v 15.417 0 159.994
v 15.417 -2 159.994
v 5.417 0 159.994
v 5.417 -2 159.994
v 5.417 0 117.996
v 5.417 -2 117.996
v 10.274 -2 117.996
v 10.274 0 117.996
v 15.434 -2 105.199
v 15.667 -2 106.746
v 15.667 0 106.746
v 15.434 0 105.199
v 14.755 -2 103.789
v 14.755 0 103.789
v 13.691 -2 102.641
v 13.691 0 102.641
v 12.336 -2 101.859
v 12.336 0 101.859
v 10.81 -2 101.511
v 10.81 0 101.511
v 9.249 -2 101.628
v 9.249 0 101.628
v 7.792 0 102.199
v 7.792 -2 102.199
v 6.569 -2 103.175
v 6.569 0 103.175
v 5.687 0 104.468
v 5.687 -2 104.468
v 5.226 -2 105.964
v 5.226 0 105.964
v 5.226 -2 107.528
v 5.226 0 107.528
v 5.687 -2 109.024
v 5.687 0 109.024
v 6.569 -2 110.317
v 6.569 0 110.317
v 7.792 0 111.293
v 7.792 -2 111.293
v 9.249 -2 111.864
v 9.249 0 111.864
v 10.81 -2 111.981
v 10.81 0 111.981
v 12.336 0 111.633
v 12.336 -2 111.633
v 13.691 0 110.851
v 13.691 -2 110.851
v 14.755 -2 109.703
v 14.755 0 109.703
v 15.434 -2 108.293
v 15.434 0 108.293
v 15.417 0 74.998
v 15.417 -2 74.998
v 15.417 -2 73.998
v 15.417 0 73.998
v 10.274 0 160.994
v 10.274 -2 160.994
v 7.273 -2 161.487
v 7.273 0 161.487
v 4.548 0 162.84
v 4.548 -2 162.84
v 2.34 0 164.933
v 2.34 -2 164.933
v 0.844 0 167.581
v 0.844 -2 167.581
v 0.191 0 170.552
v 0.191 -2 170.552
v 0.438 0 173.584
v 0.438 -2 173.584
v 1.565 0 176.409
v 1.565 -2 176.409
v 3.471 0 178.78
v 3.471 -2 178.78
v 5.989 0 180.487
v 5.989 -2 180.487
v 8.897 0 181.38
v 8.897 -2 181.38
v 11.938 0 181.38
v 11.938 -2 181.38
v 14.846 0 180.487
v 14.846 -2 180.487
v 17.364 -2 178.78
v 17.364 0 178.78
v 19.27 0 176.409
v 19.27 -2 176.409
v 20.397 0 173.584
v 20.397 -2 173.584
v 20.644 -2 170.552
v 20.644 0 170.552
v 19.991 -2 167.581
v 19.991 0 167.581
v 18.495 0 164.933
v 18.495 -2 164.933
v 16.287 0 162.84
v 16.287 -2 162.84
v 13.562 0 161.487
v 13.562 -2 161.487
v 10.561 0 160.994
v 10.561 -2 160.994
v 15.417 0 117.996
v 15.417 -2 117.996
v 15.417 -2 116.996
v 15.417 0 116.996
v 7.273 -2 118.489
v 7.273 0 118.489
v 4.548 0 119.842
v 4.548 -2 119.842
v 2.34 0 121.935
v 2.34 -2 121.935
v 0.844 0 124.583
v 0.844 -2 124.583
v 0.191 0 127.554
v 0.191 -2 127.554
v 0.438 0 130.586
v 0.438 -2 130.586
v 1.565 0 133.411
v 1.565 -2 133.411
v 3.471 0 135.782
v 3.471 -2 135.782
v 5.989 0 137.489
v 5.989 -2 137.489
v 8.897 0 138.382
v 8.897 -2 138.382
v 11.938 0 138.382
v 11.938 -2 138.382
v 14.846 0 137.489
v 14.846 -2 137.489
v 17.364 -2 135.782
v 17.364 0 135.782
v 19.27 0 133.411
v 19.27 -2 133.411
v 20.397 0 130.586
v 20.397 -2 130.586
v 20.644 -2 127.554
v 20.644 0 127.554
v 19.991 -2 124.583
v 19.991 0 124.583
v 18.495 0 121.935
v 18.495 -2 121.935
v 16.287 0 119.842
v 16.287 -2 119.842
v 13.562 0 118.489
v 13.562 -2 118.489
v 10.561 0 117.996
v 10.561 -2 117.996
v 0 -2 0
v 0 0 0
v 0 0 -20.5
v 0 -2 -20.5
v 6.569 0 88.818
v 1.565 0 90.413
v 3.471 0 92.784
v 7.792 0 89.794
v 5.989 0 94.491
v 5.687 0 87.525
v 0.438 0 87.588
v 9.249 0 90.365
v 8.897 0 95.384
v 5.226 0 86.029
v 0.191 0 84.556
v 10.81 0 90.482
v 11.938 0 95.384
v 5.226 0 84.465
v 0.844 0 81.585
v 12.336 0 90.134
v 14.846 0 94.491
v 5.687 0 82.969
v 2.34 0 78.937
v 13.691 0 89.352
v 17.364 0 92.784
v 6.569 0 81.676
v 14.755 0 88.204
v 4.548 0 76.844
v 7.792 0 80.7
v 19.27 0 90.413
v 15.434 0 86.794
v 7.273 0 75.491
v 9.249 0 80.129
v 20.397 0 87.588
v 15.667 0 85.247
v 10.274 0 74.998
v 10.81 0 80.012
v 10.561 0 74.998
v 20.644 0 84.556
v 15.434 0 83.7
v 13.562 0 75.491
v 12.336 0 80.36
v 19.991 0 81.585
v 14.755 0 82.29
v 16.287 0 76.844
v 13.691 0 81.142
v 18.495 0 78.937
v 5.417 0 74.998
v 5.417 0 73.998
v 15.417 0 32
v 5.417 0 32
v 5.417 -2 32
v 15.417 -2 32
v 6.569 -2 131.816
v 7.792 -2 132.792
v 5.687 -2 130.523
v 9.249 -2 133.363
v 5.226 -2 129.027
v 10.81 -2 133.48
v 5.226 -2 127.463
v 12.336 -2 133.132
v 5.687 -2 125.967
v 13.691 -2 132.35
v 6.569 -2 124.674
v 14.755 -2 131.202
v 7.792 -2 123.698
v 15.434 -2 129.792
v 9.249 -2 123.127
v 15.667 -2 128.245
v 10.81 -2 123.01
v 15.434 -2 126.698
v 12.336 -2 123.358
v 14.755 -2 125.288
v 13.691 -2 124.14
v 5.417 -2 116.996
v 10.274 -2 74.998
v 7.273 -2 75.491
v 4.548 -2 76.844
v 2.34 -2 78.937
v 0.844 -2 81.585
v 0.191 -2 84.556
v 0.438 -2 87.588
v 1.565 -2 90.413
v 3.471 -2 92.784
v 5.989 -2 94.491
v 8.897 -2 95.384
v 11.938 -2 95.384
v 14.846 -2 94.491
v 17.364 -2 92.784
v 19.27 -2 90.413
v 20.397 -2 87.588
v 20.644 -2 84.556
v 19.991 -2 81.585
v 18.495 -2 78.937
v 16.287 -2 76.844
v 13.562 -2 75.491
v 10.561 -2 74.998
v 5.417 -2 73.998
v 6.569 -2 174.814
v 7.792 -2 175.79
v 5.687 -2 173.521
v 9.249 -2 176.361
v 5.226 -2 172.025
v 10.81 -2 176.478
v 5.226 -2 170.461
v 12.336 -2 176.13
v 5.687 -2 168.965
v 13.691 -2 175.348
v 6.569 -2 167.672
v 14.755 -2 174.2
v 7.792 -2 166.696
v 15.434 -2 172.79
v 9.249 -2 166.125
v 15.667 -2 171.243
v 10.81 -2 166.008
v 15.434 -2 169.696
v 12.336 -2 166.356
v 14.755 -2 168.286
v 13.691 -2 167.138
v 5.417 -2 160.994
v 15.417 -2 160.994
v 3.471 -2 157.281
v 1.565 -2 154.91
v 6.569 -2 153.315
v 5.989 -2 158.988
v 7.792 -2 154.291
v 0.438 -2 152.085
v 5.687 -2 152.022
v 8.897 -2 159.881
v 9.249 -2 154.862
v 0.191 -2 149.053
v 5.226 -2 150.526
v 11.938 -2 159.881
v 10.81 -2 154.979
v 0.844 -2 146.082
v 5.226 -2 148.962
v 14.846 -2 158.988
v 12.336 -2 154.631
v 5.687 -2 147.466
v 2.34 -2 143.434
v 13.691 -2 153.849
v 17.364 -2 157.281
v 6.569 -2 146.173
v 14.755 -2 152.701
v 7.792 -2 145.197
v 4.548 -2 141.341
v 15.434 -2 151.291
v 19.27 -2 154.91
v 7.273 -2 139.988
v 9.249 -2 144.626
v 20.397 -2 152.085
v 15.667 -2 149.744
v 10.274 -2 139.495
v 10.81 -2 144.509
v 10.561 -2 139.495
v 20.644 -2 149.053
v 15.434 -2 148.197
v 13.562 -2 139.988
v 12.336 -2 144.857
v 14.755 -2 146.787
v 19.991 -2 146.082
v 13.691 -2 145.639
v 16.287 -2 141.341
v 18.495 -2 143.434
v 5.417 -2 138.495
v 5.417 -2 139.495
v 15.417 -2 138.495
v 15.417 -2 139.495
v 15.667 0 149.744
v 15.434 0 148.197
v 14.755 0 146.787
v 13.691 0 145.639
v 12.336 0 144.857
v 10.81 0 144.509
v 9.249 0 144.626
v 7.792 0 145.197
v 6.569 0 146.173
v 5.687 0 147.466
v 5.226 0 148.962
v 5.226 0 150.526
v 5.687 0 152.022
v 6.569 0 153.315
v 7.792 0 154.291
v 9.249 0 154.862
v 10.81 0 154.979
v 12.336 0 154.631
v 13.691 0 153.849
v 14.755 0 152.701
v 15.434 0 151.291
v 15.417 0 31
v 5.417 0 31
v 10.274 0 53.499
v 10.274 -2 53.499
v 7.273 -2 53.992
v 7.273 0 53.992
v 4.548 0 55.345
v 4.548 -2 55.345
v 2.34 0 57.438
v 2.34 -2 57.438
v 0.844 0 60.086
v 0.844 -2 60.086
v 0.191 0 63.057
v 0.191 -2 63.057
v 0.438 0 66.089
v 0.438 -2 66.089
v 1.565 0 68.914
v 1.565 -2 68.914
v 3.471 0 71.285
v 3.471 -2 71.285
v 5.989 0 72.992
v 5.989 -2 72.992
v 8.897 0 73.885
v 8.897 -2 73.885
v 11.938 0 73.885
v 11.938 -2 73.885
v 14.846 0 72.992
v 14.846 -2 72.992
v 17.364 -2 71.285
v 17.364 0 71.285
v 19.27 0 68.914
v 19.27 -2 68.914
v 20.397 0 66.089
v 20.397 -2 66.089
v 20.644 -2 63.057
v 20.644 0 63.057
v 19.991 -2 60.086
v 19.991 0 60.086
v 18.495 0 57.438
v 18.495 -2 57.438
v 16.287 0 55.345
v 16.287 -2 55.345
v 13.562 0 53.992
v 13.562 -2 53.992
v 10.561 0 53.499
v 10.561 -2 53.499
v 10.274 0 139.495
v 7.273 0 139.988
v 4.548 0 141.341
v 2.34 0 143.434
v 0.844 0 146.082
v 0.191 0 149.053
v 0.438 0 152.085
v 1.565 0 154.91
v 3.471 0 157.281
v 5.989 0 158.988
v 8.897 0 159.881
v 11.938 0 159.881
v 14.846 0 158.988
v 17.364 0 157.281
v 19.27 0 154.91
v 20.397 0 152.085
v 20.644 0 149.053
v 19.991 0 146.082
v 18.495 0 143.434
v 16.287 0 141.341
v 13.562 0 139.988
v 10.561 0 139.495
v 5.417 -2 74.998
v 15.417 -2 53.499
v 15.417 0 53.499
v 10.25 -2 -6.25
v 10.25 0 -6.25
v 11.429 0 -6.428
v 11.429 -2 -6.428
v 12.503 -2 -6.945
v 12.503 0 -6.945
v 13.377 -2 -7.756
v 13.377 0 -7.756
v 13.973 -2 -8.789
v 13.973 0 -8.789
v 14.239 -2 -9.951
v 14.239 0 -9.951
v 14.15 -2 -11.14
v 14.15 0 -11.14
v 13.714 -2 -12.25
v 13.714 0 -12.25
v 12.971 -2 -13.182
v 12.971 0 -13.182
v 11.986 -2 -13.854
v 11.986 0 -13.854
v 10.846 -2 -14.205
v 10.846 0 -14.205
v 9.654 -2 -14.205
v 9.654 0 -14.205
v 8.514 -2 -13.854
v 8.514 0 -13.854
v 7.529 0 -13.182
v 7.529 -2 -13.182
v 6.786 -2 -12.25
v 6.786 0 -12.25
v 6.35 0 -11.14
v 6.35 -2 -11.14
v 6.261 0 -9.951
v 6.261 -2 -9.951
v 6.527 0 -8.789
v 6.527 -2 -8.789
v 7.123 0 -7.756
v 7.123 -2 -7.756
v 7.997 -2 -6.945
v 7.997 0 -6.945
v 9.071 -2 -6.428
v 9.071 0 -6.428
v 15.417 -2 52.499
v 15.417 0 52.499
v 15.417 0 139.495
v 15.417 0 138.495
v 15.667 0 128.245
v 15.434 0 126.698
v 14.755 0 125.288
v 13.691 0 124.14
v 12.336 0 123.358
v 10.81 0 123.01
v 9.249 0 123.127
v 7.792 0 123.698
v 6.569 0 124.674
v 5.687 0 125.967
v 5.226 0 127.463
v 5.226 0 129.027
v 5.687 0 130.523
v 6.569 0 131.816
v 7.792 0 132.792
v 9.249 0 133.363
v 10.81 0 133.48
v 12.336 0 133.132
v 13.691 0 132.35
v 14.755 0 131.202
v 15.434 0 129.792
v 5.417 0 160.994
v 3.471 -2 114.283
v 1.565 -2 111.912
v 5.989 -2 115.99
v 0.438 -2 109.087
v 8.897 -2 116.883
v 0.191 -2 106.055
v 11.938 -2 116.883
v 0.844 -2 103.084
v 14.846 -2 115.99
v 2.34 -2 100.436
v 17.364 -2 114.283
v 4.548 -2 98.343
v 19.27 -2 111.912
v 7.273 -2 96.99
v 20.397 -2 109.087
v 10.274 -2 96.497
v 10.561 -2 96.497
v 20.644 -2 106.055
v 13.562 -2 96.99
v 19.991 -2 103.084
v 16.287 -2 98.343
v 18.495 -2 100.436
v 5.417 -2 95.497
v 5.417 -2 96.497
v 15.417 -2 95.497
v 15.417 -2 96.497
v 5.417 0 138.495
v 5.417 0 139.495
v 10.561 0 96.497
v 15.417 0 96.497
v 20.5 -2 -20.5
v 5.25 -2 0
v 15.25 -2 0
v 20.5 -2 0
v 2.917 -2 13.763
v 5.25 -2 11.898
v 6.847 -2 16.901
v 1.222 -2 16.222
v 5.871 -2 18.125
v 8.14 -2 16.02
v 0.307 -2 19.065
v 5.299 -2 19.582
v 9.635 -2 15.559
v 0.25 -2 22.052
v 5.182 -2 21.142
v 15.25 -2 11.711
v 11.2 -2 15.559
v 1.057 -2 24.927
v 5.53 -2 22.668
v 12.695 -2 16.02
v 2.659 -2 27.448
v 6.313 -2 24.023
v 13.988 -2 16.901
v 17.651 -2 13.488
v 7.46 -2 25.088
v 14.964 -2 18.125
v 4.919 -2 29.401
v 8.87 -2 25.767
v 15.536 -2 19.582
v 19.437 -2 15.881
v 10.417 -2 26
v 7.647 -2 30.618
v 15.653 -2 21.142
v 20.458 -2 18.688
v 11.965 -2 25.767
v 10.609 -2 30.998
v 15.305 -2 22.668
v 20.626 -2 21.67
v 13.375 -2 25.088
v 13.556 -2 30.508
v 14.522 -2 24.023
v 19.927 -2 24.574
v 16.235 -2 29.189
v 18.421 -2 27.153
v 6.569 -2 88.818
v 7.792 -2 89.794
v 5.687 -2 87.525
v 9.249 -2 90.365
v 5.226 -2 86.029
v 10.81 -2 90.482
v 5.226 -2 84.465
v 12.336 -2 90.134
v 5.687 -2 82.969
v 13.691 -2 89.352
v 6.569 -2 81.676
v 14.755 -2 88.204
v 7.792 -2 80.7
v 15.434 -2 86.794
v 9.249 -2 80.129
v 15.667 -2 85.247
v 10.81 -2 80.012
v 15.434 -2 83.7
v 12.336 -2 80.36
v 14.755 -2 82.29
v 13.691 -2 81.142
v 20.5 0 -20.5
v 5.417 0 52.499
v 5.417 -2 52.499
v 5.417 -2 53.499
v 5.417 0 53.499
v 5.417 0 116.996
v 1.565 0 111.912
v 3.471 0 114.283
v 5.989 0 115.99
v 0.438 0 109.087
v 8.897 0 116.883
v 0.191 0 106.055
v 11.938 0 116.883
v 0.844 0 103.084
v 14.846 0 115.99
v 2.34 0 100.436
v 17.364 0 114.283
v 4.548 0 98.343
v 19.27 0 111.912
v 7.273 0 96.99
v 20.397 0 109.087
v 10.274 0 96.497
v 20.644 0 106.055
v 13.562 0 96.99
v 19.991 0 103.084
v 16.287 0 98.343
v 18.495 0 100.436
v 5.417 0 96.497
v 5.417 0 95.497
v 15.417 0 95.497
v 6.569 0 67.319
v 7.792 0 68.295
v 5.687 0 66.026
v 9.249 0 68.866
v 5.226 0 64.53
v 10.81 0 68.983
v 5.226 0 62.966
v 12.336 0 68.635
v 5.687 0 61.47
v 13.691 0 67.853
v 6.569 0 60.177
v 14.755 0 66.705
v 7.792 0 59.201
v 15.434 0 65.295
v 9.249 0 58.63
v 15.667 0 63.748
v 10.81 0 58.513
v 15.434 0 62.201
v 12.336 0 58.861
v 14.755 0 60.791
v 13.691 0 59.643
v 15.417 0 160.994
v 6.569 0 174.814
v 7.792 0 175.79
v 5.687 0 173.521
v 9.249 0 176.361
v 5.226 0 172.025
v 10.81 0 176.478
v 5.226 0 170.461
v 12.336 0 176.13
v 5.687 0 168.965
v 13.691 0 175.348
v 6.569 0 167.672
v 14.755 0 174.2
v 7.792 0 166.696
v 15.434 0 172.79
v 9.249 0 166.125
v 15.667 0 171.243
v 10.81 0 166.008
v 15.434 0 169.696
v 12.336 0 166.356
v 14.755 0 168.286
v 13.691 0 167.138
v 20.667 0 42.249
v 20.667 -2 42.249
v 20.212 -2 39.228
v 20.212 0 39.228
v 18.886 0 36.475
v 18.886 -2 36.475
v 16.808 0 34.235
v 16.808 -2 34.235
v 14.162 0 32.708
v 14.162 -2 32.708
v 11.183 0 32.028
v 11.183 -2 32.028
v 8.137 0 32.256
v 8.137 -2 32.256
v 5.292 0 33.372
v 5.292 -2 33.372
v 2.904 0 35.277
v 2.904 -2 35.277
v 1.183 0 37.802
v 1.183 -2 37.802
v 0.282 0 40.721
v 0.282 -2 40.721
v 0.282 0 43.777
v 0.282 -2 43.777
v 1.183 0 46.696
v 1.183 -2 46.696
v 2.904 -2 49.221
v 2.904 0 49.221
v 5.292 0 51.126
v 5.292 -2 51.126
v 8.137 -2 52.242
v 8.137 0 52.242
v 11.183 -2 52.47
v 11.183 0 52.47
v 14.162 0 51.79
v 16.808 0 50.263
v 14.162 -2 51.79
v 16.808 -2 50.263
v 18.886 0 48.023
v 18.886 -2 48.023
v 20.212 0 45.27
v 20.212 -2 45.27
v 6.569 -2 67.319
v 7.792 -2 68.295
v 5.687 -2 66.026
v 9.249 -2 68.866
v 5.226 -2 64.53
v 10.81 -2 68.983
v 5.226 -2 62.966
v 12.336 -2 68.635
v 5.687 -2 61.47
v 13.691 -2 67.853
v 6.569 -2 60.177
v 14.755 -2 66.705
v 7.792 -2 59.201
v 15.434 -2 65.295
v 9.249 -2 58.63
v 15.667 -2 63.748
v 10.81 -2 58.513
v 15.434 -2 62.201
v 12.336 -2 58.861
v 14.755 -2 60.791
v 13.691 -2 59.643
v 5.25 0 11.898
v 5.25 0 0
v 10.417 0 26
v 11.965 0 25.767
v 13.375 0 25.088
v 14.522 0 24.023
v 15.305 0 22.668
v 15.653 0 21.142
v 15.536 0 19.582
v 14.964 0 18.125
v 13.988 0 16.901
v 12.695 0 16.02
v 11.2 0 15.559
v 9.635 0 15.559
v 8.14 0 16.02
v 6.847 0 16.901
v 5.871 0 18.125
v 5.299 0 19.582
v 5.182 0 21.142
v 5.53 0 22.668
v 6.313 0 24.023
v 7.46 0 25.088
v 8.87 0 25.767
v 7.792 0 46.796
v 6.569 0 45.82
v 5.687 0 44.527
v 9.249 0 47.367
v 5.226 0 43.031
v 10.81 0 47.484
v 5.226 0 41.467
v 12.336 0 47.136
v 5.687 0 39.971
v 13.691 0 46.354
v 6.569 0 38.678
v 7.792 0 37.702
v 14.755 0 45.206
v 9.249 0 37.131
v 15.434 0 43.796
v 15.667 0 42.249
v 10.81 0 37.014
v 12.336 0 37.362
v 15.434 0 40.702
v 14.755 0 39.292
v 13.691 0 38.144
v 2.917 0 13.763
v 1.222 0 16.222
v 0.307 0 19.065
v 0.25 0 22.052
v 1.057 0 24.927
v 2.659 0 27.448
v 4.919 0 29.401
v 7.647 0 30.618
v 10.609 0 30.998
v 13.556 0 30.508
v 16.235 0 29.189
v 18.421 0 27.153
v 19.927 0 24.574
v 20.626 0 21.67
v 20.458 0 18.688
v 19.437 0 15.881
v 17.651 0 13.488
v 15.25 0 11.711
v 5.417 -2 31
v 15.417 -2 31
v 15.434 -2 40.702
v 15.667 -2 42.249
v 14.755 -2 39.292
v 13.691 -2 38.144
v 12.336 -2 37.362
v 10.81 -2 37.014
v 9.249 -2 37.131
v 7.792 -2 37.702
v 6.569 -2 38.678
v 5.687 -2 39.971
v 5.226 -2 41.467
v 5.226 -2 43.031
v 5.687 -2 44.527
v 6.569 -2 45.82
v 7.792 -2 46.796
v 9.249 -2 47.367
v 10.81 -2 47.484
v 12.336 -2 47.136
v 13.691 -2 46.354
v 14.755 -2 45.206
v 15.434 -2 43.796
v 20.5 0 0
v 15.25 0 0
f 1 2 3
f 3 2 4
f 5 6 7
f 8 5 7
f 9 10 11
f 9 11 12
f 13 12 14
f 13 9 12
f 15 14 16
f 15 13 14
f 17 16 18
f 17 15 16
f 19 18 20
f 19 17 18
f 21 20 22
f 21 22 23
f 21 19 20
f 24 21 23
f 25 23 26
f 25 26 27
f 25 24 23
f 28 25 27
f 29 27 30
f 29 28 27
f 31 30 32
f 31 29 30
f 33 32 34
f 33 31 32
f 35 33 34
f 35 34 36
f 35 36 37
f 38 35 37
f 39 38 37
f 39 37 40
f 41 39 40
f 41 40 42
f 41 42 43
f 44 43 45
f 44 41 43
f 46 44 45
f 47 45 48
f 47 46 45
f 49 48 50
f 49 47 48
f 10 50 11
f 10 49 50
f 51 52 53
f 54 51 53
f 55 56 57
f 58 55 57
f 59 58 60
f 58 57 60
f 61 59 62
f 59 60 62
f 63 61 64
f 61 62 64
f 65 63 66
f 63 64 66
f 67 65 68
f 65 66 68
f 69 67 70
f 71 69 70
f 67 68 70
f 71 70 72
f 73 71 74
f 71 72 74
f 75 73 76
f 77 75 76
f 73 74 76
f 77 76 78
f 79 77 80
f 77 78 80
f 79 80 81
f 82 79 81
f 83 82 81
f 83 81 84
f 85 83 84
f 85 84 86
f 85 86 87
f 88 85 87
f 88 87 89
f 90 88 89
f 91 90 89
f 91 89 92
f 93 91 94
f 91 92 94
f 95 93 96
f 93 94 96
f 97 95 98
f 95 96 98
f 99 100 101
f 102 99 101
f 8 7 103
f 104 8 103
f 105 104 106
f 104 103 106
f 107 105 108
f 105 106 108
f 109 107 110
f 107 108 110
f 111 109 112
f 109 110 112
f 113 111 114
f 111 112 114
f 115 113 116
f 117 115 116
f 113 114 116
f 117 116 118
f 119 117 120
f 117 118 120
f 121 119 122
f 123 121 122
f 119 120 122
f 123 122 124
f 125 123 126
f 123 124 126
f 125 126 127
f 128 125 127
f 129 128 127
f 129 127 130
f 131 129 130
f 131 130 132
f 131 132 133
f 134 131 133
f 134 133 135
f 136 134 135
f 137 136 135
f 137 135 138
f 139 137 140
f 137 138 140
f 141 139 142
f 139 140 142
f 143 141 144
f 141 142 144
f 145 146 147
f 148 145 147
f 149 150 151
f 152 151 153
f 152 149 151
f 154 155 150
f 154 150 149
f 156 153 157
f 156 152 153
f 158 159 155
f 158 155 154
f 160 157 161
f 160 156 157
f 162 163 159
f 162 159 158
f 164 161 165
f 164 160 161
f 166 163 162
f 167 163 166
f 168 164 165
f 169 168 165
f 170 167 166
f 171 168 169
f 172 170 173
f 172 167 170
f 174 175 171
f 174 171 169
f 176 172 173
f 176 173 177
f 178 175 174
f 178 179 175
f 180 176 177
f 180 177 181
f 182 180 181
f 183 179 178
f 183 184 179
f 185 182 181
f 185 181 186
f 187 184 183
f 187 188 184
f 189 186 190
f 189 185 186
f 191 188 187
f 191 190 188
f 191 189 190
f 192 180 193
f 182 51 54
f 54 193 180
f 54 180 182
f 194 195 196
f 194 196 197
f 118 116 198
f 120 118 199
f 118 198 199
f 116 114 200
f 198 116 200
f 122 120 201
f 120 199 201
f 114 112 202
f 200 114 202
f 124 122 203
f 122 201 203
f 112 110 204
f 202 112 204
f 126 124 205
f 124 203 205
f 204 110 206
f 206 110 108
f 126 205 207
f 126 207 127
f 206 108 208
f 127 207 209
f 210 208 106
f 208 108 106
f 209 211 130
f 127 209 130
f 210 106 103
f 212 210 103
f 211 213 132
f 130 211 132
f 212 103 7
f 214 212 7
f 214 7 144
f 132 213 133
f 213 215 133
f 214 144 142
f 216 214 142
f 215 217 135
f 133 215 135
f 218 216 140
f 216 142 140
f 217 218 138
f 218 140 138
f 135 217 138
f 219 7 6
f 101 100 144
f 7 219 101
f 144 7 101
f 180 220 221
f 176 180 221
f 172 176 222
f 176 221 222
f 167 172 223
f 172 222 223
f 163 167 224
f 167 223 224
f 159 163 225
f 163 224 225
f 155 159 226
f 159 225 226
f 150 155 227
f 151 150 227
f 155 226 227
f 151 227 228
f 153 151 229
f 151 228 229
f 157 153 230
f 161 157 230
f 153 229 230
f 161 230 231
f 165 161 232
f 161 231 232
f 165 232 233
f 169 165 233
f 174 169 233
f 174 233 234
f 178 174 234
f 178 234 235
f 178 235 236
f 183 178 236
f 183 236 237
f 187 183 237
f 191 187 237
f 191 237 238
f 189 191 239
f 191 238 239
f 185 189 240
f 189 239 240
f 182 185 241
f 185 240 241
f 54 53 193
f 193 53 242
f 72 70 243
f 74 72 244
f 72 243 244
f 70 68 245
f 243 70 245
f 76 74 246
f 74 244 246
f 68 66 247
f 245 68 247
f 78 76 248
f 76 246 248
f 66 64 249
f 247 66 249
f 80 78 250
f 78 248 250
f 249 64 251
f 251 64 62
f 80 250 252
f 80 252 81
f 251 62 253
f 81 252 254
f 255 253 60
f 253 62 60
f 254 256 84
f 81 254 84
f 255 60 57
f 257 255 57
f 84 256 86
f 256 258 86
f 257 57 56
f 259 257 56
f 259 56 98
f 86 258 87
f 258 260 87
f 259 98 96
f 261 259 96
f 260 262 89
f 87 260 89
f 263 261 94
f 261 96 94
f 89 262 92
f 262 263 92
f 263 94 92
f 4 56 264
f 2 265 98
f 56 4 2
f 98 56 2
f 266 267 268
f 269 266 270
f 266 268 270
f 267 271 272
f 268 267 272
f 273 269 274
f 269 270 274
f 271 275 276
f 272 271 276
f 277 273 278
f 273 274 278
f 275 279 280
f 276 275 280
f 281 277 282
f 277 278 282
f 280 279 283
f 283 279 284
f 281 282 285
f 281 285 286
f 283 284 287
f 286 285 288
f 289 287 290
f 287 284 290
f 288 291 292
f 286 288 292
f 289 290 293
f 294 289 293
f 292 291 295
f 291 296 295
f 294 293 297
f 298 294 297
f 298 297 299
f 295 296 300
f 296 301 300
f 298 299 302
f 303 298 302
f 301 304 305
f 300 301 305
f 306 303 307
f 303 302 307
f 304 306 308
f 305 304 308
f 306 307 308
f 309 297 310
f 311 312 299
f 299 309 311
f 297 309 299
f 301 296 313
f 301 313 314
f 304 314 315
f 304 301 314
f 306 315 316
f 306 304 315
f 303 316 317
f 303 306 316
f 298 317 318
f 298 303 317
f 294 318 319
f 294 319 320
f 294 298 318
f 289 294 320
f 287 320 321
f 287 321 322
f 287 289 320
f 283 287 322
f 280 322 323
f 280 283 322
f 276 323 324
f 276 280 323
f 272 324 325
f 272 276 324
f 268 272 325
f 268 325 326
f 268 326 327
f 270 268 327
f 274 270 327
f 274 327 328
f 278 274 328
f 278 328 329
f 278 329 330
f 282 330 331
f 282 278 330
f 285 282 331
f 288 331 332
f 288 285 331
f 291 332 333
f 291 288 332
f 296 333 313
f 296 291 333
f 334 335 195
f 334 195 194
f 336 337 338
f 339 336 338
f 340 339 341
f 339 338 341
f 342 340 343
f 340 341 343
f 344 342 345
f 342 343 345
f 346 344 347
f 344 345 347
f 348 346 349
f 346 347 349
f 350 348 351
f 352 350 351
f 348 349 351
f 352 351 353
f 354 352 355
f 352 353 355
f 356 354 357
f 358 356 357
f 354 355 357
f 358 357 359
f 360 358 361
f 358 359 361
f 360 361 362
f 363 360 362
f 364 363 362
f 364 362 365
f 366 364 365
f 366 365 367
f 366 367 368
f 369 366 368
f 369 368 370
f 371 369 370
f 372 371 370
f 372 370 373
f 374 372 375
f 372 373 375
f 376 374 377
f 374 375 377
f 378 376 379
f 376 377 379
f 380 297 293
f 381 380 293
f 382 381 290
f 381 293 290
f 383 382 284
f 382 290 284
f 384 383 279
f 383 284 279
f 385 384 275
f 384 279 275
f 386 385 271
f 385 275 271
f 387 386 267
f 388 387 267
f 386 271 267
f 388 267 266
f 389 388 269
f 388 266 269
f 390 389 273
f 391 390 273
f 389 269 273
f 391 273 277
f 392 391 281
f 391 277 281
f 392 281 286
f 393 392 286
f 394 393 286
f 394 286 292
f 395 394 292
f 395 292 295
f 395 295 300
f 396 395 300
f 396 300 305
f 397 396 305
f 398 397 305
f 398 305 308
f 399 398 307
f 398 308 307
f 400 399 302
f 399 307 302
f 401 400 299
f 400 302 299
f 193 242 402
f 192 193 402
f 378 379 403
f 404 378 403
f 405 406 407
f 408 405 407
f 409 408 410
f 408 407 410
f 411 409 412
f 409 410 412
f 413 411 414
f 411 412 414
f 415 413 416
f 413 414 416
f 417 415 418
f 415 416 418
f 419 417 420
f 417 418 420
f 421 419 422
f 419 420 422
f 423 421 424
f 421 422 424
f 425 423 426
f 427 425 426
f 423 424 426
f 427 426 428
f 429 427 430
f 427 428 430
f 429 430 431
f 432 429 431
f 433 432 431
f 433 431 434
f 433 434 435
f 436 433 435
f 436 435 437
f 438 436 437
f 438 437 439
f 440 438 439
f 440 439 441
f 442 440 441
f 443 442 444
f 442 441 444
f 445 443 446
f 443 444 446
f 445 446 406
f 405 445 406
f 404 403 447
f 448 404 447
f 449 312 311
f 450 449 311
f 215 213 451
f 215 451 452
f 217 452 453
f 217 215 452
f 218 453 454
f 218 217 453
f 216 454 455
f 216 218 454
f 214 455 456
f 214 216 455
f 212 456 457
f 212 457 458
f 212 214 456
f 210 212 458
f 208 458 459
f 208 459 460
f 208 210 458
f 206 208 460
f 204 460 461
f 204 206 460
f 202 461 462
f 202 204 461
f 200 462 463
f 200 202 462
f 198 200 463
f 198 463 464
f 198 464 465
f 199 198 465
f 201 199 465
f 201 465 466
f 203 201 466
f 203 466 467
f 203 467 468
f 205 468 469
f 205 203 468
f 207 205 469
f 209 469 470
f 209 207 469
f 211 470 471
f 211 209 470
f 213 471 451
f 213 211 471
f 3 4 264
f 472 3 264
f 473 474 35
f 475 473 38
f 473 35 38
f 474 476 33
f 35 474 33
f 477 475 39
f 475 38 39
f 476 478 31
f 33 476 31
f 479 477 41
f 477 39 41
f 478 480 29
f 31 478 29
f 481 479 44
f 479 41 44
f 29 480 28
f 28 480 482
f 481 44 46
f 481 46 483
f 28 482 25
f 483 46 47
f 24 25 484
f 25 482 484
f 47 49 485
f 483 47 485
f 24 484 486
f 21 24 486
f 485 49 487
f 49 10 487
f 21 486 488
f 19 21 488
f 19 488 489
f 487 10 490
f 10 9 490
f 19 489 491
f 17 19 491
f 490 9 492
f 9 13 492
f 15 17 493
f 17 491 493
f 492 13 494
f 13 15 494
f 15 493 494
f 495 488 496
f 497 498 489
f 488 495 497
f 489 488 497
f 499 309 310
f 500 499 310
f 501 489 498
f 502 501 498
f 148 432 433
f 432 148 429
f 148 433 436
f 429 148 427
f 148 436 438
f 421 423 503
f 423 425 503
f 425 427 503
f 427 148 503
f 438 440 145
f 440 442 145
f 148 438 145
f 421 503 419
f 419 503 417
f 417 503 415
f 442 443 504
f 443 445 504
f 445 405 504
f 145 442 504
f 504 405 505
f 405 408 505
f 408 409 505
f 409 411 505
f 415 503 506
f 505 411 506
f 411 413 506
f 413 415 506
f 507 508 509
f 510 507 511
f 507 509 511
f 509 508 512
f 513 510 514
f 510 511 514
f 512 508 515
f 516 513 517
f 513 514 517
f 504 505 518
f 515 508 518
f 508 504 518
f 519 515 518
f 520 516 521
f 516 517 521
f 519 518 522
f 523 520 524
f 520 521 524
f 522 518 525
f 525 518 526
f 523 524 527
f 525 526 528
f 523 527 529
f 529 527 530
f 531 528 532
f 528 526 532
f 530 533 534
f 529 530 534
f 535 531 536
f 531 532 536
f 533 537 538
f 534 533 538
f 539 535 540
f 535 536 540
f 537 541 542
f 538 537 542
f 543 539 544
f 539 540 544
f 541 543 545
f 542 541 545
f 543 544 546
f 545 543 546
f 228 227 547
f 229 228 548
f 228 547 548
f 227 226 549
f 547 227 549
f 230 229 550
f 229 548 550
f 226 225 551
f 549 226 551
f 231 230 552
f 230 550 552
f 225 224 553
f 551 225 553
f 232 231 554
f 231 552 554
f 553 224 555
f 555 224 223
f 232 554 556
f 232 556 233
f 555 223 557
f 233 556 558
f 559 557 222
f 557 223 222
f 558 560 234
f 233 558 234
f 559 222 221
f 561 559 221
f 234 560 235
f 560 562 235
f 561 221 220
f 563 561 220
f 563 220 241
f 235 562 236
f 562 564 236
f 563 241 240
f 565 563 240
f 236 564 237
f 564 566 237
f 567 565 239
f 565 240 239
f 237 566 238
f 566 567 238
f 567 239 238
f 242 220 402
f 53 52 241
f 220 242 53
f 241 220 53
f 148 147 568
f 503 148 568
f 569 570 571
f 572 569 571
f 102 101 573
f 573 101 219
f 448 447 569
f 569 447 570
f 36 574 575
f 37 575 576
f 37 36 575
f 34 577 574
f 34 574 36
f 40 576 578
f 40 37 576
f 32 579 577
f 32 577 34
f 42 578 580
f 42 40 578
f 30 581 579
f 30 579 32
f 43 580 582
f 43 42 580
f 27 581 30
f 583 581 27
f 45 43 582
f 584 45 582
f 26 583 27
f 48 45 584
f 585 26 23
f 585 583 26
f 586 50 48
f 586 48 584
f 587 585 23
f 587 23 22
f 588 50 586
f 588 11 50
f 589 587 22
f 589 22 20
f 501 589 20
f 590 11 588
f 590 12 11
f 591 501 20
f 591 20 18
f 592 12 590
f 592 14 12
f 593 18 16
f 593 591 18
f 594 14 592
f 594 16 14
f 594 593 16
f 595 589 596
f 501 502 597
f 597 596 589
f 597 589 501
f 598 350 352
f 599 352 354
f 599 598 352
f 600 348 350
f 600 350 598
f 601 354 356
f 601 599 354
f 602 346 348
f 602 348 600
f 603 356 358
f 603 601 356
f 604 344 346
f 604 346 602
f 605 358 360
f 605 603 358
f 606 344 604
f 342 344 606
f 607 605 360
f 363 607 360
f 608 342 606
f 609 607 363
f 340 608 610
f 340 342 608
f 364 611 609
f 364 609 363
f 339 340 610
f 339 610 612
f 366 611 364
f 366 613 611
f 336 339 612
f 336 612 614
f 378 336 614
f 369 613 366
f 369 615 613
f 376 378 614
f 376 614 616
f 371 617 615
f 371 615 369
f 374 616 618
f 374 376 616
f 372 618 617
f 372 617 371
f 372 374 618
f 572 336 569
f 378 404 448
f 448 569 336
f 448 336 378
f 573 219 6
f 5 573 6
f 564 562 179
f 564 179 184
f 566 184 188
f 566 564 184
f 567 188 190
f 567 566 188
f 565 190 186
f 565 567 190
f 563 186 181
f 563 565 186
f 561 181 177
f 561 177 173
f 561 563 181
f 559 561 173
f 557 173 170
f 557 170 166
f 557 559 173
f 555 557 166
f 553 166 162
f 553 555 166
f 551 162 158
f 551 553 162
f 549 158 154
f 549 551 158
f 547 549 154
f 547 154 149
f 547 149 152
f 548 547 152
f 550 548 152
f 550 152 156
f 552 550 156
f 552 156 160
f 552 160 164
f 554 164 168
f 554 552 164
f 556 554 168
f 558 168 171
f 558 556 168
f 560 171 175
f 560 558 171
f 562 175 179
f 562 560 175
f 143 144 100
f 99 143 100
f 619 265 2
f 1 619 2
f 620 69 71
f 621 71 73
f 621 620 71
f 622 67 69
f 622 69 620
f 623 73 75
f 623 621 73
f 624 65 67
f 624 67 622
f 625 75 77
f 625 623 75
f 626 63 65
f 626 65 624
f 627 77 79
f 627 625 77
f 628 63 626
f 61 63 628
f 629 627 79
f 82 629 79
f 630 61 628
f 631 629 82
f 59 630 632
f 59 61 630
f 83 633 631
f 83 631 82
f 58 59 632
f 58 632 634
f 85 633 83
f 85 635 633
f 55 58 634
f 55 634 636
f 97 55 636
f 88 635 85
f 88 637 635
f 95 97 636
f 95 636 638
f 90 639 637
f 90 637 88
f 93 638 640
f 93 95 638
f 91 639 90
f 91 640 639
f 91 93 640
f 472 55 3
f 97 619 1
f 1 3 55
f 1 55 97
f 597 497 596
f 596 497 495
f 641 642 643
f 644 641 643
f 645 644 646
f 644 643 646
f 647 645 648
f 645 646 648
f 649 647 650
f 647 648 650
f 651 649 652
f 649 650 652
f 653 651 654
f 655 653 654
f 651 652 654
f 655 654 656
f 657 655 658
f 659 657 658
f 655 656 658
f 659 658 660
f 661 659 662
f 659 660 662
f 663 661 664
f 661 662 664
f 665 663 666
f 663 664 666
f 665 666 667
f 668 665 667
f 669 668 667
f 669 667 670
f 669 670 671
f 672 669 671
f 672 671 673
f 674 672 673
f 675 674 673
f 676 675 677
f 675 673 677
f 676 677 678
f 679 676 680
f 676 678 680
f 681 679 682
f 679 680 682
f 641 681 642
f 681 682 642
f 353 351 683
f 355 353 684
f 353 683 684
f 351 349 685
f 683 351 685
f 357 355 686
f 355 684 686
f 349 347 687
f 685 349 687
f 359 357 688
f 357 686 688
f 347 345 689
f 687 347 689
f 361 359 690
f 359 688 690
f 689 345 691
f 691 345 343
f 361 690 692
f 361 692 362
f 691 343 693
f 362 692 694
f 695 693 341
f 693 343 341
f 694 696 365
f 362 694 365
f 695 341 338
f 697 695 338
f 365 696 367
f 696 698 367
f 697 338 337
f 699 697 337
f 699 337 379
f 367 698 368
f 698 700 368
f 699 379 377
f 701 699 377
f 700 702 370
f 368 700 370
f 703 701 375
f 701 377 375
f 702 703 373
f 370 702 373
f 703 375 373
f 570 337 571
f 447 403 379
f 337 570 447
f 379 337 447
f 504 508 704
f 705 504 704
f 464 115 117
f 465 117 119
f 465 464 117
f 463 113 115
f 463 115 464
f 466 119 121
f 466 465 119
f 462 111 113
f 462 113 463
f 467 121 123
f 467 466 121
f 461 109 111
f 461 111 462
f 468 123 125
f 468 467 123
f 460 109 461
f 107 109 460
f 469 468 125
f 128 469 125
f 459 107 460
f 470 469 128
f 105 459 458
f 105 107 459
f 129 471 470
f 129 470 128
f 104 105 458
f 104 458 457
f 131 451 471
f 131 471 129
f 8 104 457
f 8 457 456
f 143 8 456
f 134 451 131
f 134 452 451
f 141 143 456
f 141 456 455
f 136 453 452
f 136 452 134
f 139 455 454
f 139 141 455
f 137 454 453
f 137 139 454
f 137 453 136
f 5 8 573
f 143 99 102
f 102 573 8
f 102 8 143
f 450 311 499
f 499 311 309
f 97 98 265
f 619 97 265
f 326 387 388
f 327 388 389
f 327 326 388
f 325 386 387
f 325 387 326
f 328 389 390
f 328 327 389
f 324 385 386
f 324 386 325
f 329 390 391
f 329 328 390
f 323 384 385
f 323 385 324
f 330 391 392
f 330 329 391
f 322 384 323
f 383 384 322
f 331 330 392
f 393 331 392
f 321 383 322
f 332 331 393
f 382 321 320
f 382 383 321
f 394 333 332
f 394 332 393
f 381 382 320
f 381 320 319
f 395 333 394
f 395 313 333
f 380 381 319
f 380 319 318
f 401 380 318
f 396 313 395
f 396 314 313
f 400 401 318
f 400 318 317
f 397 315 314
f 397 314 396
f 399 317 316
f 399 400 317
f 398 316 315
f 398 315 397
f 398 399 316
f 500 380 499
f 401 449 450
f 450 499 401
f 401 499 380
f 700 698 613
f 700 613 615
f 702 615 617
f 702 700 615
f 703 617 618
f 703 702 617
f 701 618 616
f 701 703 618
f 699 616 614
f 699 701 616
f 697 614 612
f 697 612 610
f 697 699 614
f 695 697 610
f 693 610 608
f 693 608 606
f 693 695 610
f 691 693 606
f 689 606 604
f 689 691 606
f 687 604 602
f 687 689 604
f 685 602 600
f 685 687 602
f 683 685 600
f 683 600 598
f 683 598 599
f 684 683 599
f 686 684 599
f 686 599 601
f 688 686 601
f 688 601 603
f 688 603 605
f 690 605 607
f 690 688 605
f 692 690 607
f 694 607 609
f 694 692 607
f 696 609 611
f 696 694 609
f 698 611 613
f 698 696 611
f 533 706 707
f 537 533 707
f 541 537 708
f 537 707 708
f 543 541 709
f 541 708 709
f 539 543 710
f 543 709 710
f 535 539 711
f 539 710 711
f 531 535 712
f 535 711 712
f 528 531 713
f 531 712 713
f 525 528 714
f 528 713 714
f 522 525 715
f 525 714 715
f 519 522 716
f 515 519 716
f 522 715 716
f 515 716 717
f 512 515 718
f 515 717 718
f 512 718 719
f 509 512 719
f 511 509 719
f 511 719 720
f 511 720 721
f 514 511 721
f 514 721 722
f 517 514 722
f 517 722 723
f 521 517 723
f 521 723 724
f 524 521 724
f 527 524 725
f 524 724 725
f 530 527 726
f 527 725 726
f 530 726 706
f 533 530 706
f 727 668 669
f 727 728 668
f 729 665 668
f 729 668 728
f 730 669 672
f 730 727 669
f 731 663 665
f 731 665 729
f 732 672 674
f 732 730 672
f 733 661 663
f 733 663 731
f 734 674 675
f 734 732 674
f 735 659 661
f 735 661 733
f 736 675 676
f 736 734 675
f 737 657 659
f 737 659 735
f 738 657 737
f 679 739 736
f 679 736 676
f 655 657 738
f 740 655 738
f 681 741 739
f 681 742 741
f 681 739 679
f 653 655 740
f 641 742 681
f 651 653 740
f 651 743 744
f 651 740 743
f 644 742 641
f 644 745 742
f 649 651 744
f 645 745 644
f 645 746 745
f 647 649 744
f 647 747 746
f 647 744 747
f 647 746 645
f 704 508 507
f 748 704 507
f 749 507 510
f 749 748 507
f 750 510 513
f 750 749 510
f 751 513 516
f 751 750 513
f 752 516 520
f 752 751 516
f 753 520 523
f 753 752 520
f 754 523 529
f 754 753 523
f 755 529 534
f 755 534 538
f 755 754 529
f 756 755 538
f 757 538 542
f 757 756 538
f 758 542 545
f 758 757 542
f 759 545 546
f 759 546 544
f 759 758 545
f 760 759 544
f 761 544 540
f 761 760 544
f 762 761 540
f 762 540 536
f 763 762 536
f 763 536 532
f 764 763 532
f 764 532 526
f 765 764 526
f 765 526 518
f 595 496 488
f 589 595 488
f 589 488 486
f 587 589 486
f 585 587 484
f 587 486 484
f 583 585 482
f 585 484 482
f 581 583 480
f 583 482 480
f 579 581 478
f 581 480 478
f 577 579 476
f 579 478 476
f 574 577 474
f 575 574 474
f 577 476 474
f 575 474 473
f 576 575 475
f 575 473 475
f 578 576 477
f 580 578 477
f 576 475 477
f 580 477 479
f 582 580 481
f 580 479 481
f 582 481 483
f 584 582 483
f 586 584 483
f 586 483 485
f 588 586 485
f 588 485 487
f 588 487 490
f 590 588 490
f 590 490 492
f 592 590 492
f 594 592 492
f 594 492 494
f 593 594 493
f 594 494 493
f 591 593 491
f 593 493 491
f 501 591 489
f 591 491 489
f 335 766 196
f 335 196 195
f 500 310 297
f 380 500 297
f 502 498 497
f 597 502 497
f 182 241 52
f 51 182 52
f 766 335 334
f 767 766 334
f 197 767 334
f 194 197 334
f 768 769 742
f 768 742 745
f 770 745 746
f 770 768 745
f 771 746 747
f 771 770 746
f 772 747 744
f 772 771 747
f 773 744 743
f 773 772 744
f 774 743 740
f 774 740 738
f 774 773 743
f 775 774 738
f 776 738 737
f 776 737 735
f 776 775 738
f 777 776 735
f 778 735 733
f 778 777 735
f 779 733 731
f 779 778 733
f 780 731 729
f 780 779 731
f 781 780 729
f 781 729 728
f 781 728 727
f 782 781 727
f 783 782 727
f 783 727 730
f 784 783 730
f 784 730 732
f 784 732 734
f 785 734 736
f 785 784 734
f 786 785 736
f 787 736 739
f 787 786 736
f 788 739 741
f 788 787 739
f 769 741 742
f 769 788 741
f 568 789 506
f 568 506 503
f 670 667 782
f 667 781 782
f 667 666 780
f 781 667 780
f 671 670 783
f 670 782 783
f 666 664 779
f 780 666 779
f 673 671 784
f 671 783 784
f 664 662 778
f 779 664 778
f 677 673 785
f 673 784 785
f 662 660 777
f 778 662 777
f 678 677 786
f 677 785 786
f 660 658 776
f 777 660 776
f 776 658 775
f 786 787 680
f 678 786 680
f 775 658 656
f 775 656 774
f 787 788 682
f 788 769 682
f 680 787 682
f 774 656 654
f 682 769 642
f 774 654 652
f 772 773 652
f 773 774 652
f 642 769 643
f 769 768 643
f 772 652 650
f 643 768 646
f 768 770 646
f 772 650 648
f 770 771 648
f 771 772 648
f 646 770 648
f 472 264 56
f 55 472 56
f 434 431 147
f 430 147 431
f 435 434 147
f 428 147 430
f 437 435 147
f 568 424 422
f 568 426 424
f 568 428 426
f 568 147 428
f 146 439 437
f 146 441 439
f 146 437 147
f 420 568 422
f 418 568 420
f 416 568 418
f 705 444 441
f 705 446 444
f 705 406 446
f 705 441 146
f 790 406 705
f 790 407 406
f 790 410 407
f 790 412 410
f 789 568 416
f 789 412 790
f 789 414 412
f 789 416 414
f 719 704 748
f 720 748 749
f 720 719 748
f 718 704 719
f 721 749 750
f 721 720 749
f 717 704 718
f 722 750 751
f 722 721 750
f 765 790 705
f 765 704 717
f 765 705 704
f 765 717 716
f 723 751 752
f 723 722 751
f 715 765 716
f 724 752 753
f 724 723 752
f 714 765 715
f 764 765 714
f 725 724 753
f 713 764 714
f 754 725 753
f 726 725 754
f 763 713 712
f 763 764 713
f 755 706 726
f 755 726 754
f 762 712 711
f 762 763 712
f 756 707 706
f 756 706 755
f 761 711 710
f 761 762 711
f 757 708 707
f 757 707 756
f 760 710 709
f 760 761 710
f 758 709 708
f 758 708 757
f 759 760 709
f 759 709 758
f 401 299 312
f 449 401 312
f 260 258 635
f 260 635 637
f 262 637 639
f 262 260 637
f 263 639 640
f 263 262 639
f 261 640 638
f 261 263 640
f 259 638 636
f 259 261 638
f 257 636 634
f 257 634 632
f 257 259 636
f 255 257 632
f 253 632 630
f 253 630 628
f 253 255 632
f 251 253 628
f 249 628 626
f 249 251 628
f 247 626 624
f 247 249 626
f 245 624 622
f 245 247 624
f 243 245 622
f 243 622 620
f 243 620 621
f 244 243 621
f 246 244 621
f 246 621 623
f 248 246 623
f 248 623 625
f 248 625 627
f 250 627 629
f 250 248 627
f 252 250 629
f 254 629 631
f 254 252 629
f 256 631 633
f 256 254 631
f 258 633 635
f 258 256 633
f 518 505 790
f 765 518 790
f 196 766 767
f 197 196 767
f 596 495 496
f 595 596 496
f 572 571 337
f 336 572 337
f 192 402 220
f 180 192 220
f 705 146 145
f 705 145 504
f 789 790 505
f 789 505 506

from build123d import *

# Parameters (mm, degrees)
SKETCH1_W               = 20.5
SKETCH1_H               = 20.5
BOSS_EXTRUDE1_DEPTH     = 2
SKETCH2_R               = 4
CUT_EXTRUDE1_DEPTH      = 2
SKETCH3_W               = 10
SKETCH3_H               = 2
BOSS_EXTRUDE2_DEPTH     = 12.5
SKETCH6_R               = 10.25
BOSS_EXTRUDE3_DEPTH     = 2
SKETCH7_R               = 5.25
CUT_EXTRUDE2_DEPTH      = 2
SKETCH8_W               = 10
SKETCH8_H               = 2
BOSS_EXTRUDE4_DEPTH     = 1
LPATTERN1_START         = -2
LPATTERN1_OUTLINE_R     = 5.25
LPATTERN1_DEPTH         = 2
LPATTERN1_2_OUTLINE_R   = 5.25
LPATTERN1_2_DEPTH       = 2
LPATTERN1_3_OUTLINE_R   = 5.25
LPATTERN1_3_DEPTH       = 2
LPATTERN1_4_OUTLINE_R   = 5.25
LPATTERN1_4_DEPTH       = 2
LPATTERN1_5_OUTLINE_R   = 5.25
LPATTERN1_5_DEPTH       = 2
LPATTERN1_6_OUTLINE_R   = 5.25
LPATTERN1_6_DEPTH       = 2
LPATTERN1_7_OUTLINE_R   = 10.25
LPATTERN1_7_OUTLINE_R_2 = 5.25
LPATTERN1_7_DEPTH       = 2


with BuildPart() as part:
    # Sketch1 → Boss-Extrude1 (new body)
    with BuildSketch(Plane(origin=(0, 0, 0), x_dir=(1, 0, 0), z_dir=(0, 1, 0))):
        with Locations((10.25, 10.25)):
            Rectangle(SKETCH1_W, SKETCH1_H)
    extrude(amount=-BOSS_EXTRUDE1_DEPTH)

    # Sketch2 → Cut-Extrude1 (cut)
    with BuildSketch(Plane(origin=(0, 0, 0), x_dir=(1, 0, 0), z_dir=(0, 1, 0))):
        with Locations(Location((10.25, 10.25, 0), (0, 0, 270))):
            Circle(SKETCH2_R)
    extrude(amount=-CUT_EXTRUDE1_DEPTH, mode=Mode.SUBTRACT)

    # Sketch3 → Boss-Extrude2 (add)
    with BuildSketch(Plane.XY):
        with Locations((10.25, -1)):
            Rectangle(SKETCH3_W, SKETCH3_H)
    extrude(amount=BOSS_EXTRUDE2_DEPTH)


with BuildPart() as body_2:
    # Sketch6 → Boss-Extrude3 (new body)
    with BuildSketch(Plane(origin=(0, 0, 0), x_dir=(1, 0, 0), z_dir=(0, 1, 0))):
        with Locations(Location((10.417474337, -20.75, 0), (0, 0, 270))):
            Circle(SKETCH6_R)
    extrude(amount=-BOSS_EXTRUDE3_DEPTH)


with BuildPart() as part_1:
    add(part.part)

    # Intersect2: read off the stored shape, not the designer's step
    # Intersect2: union body 2
    add(body_2.part)

    # Sketch7 → Cut-Extrude2 (cut)
    with BuildSketch(Plane(origin=(0, 0, 0), x_dir=(1, 0, 0), z_dir=(0, 1, 0))):
        with Locations(Location((10.417474337, -20.75, 0), (0, 0, 270))):
            Circle(SKETCH7_R)
    extrude(amount=-CUT_EXTRUDE2_DEPTH, mode=Mode.SUBTRACT)


with BuildPart() as body_2_2:
    # Sketch8 → Boss-Extrude4 (new body)
    with BuildSketch(Plane.XY.offset(31)):
        with Locations((10.417474337, -1)):
            Rectangle(SKETCH8_W, SKETCH8_H)
    extrude(amount=BOSS_EXTRUDE4_DEPTH)


with BuildPart() as body_3:
    # LPattern1: read off the stored shape, not the designer's step
    # LPattern1 outline → LPattern1 (new body)
    with BuildSketch(Plane(origin=(0, 0, 0), x_dir=(1, 0, 0), z_dir=(0, 1, 0)).offset(LPATTERN1_START)):
        with BuildLine():
            Line((5.417474337, -160.994), (10.274299619, -160.994))
            ThreePointArc((10.274299619, -160.994), (10.417474338, -181.493), (10.560649056, -160.994))
            Line((10.560649056, -160.994), (15.417474337, -160.994))
            Line((15.417474337, -160.994), (15.417474337, -159.994))
            Line((15.417474337, -159.994), (5.417474337, -159.994))
            Line((5.417474337, -159.994), (5.417474337, -160.994))
        make_face()
        with Locations((10.417474337, -171.243)):
            Circle(LPATTERN1_OUTLINE_R, mode=Mode.SUBTRACT)
    extrude(amount=LPATTERN1_DEPTH)


with BuildPart() as body_4:
    # LPattern1 2 outline → LPattern1 2 (new body)
    with BuildSketch(Plane(origin=(0, 0, 0), x_dir=(1, 0, 0), z_dir=(0, 1, 0)).offset(LPATTERN1_START)):
        with BuildLine():
            Line((5.417474337, -139.495), (10.274299619, -139.495))
            ThreePointArc((10.274299619, -139.495), (10.417474338, -159.994), (10.560649056, -139.495))
            Line((10.560649056, -139.495), (15.417474337, -139.495))
            Line((15.417474337, -139.495), (15.417474337, -138.495))
            Line((15.417474337, -138.495), (5.417474337, -138.495))
            Line((5.417474337, -138.495), (5.417474337, -139.495))
        make_face()
        with Locations((10.417474337, -149.744)):
            Circle(LPATTERN1_2_OUTLINE_R, mode=Mode.SUBTRACT)
    extrude(amount=LPATTERN1_2_DEPTH)


with BuildPart() as body_5:
    # LPattern1 3 outline → LPattern1 3 (new body)
    with BuildSketch(Plane(origin=(0, 0, 0), x_dir=(1, 0, 0), z_dir=(0, 1, 0)).offset(LPATTERN1_START)):
        with BuildLine():
            Line((5.417474337, -117.996), (10.274299619, -117.996))
            ThreePointArc((10.274299619, -117.996), (10.417474338, -138.495), (10.560649056, -117.996))
            Line((10.560649056, -117.996), (15.417474337, -117.996))
            Line((15.417474337, -117.996), (15.417474337, -116.996))
            Line((15.417474337, -116.996), (5.417474337, -116.996))
            Line((5.417474337, -116.996), (5.417474337, -117.996))
        make_face()
        with Locations((10.417474337, -128.245)):
            Circle(LPATTERN1_3_OUTLINE_R, mode=Mode.SUBTRACT)
    extrude(amount=LPATTERN1_3_DEPTH)


with BuildPart() as body_6:
    # LPattern1 4 outline → LPattern1 4 (new body)
    with BuildSketch(Plane(origin=(0, 0, 0), x_dir=(1, 0, 0), z_dir=(0, 1, 0)).offset(LPATTERN1_START)):
        with BuildLine():
            Line((5.417474337, -96.497), (10.274299619, -96.497))
            ThreePointArc((10.274299619, -96.497), (10.417474338, -116.996), (10.560649056, -96.497))
            Line((10.560649056, -96.497), (15.417474337, -96.497))
            Line((15.417474337, -96.497), (15.417474337, -95.497))
            Line((15.417474337, -95.497), (5.417474337, -95.497))
            Line((5.417474337, -95.497), (5.417474337, -96.497))
        make_face()
        with Locations((10.417474337, -106.746)):
            Circle(LPATTERN1_4_OUTLINE_R, mode=Mode.SUBTRACT)
    extrude(amount=LPATTERN1_4_DEPTH)


with BuildPart() as body_7:
    # LPattern1 5 outline → LPattern1 5 (new body)
    with BuildSketch(Plane(origin=(0, 0, 0), x_dir=(1, 0, 0), z_dir=(0, 1, 0)).offset(LPATTERN1_START)):
        with BuildLine():
            Line((5.417474337, -74.998), (10.274299619, -74.998))
            ThreePointArc((10.274299619, -74.998), (10.417474338, -95.497), (10.560649056, -74.998))
            Line((10.560649056, -74.998), (15.417474337, -74.998))
            Line((15.417474337, -74.998), (15.417474337, -73.998))
            Line((15.417474337, -73.998), (5.417474337, -73.998))
            Line((5.417474337, -73.998), (5.417474337, -74.998))
        make_face()
        with Locations((10.417474337, -85.247)):
            Circle(LPATTERN1_5_OUTLINE_R, mode=Mode.SUBTRACT)
    extrude(amount=LPATTERN1_5_DEPTH)


with BuildPart() as body_8:
    # LPattern1 6 outline → LPattern1 6 (new body)
    with BuildSketch(Plane(origin=(0, 0, 0), x_dir=(1, 0, 0), z_dir=(0, 1, 0)).offset(LPATTERN1_START)):
        with BuildLine():
            Line((5.417474337, -53.499), (10.274299619, -53.499))
            ThreePointArc((10.274299619, -53.499), (10.417474338, -73.998), (10.560649056, -53.499))
            Line((10.560649056, -53.499), (15.417474337, -53.499))
            Line((15.417474337, -53.499), (15.417474337, -52.499))
            Line((15.417474337, -52.499), (5.417474337, -52.499))
            Line((5.417474337, -52.499), (5.417474337, -53.499))
        make_face()
        with Locations((10.417474337, -63.748)):
            Circle(LPATTERN1_6_OUTLINE_R, mode=Mode.SUBTRACT)
    extrude(amount=LPATTERN1_6_DEPTH)


with BuildPart() as body_9:
    # LPattern1 7 outline → LPattern1 7 (new body)
    with BuildSketch(Plane(origin=(0, 0, 0), x_dir=(1, 0, 0), z_dir=(0, 1, 0)).offset(LPATTERN1_START)):
        with Locations((10.417474337, -42.249)):
            Circle(LPATTERN1_7_OUTLINE_R)
        with Locations((10.417474337, -42.249)):
            Circle(LPATTERN1_7_OUTLINE_R_2, mode=Mode.SUBTRACT)
    extrude(amount=LPATTERN1_7_DEPTH)


solid = Compound([part_1.part, body_2_2.part, body_3.part, body_4.part, body_5.part, body_6.part, body_7.part, body_8.part, body_9.part])
